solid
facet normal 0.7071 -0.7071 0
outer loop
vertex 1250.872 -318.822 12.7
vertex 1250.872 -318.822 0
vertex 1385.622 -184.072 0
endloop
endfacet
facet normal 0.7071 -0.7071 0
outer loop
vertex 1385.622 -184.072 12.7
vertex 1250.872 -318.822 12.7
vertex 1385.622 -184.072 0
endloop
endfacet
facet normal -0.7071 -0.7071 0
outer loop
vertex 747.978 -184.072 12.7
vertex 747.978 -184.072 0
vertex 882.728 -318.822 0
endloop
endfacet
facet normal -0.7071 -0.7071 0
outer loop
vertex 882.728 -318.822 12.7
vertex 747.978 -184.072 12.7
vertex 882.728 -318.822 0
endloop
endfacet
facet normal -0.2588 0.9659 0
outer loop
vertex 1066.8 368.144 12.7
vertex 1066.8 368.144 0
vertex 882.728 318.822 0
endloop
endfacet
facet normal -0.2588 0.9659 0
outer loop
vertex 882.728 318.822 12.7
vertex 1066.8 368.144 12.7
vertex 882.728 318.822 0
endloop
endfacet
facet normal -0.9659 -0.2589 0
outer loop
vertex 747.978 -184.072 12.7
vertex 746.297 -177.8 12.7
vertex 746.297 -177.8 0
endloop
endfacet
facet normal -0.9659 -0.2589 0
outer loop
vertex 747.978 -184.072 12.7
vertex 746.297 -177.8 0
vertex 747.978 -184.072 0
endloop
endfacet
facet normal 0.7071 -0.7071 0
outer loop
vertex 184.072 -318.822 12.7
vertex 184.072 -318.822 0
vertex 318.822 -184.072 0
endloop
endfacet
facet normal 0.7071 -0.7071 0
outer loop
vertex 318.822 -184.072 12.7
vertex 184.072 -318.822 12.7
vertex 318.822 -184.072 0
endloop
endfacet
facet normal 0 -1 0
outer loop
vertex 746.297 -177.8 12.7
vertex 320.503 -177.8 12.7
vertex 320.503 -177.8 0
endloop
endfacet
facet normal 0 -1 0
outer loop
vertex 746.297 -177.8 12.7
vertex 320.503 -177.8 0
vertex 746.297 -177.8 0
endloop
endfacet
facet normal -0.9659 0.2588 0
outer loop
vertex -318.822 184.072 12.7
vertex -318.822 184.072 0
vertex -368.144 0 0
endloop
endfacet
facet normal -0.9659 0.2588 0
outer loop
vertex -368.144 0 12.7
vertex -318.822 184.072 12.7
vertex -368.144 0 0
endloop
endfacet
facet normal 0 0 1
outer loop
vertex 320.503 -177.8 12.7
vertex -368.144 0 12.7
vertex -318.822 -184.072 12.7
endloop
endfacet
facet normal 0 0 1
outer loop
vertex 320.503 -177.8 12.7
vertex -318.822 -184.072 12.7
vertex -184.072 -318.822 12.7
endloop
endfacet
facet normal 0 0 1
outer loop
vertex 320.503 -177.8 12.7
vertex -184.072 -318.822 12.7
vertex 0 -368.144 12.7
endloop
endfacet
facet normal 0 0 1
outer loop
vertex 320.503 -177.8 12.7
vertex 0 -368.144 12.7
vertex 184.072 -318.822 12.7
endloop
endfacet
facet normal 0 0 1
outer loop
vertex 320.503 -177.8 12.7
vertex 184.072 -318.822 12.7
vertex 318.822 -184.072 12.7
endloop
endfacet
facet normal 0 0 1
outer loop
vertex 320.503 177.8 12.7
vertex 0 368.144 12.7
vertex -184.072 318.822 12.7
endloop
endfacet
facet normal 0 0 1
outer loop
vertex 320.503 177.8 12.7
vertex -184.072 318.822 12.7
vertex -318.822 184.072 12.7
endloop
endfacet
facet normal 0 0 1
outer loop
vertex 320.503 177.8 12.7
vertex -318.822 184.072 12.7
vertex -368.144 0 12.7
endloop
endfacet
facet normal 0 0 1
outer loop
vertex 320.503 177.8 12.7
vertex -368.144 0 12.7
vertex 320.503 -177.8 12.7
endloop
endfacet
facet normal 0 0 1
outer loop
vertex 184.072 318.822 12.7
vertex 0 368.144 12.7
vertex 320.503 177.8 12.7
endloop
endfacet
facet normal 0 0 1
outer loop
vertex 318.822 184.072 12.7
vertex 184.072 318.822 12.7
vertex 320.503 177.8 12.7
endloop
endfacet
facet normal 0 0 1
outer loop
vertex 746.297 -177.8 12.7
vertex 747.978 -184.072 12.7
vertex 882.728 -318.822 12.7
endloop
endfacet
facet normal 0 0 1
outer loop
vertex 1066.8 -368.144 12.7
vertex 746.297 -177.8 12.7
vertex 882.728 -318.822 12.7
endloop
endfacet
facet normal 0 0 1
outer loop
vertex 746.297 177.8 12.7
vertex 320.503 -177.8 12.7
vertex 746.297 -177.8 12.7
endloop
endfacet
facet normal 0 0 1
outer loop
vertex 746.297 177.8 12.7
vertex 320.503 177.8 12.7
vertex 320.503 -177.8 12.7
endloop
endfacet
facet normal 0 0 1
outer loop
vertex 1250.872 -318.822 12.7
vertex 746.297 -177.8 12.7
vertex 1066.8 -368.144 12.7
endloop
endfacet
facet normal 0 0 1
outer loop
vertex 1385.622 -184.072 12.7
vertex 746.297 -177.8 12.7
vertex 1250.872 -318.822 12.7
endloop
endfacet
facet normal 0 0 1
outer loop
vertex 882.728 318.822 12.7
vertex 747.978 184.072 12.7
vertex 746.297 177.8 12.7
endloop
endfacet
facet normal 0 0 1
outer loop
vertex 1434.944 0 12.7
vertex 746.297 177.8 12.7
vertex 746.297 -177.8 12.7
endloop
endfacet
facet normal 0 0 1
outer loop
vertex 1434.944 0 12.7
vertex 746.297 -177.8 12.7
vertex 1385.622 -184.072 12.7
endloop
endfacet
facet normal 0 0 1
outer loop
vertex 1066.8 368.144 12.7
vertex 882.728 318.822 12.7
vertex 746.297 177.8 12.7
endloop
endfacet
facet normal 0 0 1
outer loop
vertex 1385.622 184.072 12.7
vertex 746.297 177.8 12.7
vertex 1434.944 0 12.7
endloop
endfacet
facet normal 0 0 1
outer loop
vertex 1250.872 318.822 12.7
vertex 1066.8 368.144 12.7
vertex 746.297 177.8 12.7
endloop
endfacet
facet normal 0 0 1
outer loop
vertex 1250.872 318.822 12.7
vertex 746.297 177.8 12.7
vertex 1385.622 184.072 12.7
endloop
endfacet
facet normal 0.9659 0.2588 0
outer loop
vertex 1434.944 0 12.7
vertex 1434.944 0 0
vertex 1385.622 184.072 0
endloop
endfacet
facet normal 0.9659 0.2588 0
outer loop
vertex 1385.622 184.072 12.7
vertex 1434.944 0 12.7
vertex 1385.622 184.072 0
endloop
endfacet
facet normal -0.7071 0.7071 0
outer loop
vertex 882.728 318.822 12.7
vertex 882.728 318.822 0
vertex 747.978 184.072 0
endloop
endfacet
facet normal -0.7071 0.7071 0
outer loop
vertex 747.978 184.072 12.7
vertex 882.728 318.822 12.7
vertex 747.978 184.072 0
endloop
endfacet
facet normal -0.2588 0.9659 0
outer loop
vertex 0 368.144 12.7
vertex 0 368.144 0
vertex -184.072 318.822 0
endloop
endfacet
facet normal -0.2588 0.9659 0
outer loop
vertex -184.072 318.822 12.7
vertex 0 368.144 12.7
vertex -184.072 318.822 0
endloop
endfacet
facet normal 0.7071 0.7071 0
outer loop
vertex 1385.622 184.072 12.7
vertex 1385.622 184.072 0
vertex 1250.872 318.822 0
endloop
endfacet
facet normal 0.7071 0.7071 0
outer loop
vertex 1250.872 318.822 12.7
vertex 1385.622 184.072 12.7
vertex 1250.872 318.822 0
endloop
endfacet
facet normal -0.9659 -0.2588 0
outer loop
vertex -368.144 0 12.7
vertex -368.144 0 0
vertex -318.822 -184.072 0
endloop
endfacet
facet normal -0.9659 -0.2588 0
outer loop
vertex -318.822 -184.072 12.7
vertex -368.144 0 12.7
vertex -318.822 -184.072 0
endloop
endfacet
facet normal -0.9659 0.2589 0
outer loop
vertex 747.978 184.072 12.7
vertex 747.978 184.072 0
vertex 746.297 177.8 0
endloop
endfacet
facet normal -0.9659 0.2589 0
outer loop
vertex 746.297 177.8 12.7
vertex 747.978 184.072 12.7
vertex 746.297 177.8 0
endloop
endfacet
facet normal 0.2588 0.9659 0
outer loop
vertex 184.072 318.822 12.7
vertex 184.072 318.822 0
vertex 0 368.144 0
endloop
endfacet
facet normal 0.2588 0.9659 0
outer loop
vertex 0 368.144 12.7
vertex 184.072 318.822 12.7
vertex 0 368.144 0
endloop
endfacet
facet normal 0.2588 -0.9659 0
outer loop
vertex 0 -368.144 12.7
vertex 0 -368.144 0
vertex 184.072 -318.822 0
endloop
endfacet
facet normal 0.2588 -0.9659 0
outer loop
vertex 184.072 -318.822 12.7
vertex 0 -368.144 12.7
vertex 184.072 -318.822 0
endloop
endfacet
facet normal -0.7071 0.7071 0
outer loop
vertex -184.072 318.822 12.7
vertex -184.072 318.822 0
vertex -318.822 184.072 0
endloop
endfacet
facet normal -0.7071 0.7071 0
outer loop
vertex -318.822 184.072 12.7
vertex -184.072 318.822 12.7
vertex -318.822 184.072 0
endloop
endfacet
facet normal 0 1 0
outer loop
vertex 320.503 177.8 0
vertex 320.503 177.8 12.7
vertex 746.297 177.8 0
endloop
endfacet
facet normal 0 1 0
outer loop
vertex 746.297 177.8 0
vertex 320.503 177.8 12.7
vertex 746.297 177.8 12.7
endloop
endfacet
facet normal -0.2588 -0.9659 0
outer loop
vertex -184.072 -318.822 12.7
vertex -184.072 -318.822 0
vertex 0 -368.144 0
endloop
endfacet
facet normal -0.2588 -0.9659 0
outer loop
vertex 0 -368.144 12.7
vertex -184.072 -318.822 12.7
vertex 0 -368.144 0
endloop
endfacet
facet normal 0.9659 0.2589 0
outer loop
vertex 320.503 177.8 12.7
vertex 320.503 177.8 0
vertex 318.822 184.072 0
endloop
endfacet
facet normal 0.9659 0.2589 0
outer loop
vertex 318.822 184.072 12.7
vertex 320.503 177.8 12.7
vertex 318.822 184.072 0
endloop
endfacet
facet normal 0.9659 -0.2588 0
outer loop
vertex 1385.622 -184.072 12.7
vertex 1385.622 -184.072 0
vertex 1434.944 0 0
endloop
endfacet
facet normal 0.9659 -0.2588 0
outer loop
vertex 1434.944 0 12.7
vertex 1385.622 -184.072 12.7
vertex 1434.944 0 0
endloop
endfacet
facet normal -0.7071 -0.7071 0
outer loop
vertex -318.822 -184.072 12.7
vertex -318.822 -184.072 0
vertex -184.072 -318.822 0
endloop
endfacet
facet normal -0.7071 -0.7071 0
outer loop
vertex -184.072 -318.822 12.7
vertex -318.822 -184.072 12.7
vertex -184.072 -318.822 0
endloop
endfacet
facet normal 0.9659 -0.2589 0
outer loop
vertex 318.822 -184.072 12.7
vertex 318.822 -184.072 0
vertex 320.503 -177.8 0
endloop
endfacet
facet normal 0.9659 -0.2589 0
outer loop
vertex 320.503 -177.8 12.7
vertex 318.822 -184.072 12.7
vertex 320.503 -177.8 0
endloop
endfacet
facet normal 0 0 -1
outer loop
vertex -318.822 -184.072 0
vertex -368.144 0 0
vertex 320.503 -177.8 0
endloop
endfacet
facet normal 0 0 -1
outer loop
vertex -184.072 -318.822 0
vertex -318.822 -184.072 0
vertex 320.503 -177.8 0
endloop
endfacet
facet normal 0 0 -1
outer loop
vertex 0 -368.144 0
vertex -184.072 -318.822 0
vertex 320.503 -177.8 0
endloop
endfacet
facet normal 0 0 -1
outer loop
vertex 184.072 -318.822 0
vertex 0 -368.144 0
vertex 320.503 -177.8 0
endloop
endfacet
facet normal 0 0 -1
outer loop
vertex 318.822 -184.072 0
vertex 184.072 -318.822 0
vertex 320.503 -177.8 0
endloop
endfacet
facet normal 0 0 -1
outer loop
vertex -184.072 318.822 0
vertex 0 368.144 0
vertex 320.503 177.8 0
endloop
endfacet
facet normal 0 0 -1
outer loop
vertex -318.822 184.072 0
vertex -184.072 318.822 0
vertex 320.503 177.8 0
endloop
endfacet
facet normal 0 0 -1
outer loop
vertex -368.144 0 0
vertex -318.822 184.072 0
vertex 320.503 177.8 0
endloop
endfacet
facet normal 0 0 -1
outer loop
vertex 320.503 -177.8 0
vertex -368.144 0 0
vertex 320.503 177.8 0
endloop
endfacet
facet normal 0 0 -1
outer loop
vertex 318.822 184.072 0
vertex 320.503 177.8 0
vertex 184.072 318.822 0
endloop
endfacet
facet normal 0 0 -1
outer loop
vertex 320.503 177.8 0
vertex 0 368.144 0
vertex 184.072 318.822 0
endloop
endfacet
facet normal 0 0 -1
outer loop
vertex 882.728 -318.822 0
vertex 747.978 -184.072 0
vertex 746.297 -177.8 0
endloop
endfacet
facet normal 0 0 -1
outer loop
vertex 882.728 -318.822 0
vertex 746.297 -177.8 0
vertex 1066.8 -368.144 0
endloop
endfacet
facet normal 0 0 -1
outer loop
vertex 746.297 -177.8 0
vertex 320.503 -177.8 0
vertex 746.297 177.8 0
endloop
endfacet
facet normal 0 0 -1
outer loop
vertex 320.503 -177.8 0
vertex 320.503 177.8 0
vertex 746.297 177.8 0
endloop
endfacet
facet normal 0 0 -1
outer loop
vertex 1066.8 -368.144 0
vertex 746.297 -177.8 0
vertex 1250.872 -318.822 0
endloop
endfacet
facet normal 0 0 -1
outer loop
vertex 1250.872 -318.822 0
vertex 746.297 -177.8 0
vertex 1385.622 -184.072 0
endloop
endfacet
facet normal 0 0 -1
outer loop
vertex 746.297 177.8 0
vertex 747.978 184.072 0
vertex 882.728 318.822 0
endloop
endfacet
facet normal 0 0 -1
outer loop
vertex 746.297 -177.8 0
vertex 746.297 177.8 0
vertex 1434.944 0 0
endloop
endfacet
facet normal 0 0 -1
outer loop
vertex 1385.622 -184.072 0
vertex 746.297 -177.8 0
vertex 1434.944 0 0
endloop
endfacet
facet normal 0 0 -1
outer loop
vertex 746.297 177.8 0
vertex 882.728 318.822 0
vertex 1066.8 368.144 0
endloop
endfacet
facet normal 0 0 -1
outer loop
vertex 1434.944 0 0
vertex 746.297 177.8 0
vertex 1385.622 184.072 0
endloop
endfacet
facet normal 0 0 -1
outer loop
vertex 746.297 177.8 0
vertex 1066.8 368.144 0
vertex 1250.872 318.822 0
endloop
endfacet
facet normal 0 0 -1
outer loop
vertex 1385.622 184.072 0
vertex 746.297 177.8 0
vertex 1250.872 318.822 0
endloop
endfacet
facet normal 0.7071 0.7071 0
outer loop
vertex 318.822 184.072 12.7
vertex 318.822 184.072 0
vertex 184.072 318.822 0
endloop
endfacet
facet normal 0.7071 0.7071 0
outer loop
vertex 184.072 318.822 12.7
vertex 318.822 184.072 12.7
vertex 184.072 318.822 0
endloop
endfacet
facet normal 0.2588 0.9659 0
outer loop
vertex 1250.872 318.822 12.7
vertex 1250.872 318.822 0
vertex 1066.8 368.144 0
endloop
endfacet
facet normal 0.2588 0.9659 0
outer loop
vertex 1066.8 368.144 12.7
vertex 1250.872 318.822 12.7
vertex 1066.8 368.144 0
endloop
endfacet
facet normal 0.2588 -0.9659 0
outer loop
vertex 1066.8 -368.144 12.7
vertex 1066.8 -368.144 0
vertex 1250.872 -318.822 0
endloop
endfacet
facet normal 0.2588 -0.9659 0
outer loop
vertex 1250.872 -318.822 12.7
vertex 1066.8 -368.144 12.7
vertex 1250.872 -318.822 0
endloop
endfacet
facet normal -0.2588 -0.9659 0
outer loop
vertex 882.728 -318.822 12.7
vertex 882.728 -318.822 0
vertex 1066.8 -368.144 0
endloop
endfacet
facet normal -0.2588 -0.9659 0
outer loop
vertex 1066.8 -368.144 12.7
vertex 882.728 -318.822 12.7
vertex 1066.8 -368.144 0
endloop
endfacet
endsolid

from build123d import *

# Parameters (mm, degrees)
F1_DEPTH = 12.7
F3_W     = 1066.8
F3_H     = 355.6
F4_DEPTH = 12.7


with BuildPart() as f1:
    # F0 (on Top) → F1 (new body)
    with BuildSketch(Plane.XY):
        Polygon((184.072105, 318.822238), (0, 368.14421), (-184.072105, 318.822238), (-318.822238, 184.072105), (-368.14421, 0), (-318.822238, -184.072105), (-184.072105, -318.822238), (0, -368.14421), (184.072105, -318.822238), (318.822238, -184.072105), (368.14421, 0), (318.822238, 184.072105), align=None)
    extrude(amount=F1_DEPTH)



with BuildPart() as f2_1:
    # F2: copy of F1
    add(f1.part.moved(Location((1066.8, 0, 0))))


with BuildPart() as f1_1:
    add(f1.part)

    add(f2_1.part)  # F4 merges F2_1
    # F3 (on face) → F4 (join, through all)
    with BuildSketch(Plane.XY.offset(12.7)):
        with Locations((533.4, 0)):
            Rectangle(F3_W, F3_H)
    extrude(amount=-F4_DEPTH)


solid = f1_1.part
